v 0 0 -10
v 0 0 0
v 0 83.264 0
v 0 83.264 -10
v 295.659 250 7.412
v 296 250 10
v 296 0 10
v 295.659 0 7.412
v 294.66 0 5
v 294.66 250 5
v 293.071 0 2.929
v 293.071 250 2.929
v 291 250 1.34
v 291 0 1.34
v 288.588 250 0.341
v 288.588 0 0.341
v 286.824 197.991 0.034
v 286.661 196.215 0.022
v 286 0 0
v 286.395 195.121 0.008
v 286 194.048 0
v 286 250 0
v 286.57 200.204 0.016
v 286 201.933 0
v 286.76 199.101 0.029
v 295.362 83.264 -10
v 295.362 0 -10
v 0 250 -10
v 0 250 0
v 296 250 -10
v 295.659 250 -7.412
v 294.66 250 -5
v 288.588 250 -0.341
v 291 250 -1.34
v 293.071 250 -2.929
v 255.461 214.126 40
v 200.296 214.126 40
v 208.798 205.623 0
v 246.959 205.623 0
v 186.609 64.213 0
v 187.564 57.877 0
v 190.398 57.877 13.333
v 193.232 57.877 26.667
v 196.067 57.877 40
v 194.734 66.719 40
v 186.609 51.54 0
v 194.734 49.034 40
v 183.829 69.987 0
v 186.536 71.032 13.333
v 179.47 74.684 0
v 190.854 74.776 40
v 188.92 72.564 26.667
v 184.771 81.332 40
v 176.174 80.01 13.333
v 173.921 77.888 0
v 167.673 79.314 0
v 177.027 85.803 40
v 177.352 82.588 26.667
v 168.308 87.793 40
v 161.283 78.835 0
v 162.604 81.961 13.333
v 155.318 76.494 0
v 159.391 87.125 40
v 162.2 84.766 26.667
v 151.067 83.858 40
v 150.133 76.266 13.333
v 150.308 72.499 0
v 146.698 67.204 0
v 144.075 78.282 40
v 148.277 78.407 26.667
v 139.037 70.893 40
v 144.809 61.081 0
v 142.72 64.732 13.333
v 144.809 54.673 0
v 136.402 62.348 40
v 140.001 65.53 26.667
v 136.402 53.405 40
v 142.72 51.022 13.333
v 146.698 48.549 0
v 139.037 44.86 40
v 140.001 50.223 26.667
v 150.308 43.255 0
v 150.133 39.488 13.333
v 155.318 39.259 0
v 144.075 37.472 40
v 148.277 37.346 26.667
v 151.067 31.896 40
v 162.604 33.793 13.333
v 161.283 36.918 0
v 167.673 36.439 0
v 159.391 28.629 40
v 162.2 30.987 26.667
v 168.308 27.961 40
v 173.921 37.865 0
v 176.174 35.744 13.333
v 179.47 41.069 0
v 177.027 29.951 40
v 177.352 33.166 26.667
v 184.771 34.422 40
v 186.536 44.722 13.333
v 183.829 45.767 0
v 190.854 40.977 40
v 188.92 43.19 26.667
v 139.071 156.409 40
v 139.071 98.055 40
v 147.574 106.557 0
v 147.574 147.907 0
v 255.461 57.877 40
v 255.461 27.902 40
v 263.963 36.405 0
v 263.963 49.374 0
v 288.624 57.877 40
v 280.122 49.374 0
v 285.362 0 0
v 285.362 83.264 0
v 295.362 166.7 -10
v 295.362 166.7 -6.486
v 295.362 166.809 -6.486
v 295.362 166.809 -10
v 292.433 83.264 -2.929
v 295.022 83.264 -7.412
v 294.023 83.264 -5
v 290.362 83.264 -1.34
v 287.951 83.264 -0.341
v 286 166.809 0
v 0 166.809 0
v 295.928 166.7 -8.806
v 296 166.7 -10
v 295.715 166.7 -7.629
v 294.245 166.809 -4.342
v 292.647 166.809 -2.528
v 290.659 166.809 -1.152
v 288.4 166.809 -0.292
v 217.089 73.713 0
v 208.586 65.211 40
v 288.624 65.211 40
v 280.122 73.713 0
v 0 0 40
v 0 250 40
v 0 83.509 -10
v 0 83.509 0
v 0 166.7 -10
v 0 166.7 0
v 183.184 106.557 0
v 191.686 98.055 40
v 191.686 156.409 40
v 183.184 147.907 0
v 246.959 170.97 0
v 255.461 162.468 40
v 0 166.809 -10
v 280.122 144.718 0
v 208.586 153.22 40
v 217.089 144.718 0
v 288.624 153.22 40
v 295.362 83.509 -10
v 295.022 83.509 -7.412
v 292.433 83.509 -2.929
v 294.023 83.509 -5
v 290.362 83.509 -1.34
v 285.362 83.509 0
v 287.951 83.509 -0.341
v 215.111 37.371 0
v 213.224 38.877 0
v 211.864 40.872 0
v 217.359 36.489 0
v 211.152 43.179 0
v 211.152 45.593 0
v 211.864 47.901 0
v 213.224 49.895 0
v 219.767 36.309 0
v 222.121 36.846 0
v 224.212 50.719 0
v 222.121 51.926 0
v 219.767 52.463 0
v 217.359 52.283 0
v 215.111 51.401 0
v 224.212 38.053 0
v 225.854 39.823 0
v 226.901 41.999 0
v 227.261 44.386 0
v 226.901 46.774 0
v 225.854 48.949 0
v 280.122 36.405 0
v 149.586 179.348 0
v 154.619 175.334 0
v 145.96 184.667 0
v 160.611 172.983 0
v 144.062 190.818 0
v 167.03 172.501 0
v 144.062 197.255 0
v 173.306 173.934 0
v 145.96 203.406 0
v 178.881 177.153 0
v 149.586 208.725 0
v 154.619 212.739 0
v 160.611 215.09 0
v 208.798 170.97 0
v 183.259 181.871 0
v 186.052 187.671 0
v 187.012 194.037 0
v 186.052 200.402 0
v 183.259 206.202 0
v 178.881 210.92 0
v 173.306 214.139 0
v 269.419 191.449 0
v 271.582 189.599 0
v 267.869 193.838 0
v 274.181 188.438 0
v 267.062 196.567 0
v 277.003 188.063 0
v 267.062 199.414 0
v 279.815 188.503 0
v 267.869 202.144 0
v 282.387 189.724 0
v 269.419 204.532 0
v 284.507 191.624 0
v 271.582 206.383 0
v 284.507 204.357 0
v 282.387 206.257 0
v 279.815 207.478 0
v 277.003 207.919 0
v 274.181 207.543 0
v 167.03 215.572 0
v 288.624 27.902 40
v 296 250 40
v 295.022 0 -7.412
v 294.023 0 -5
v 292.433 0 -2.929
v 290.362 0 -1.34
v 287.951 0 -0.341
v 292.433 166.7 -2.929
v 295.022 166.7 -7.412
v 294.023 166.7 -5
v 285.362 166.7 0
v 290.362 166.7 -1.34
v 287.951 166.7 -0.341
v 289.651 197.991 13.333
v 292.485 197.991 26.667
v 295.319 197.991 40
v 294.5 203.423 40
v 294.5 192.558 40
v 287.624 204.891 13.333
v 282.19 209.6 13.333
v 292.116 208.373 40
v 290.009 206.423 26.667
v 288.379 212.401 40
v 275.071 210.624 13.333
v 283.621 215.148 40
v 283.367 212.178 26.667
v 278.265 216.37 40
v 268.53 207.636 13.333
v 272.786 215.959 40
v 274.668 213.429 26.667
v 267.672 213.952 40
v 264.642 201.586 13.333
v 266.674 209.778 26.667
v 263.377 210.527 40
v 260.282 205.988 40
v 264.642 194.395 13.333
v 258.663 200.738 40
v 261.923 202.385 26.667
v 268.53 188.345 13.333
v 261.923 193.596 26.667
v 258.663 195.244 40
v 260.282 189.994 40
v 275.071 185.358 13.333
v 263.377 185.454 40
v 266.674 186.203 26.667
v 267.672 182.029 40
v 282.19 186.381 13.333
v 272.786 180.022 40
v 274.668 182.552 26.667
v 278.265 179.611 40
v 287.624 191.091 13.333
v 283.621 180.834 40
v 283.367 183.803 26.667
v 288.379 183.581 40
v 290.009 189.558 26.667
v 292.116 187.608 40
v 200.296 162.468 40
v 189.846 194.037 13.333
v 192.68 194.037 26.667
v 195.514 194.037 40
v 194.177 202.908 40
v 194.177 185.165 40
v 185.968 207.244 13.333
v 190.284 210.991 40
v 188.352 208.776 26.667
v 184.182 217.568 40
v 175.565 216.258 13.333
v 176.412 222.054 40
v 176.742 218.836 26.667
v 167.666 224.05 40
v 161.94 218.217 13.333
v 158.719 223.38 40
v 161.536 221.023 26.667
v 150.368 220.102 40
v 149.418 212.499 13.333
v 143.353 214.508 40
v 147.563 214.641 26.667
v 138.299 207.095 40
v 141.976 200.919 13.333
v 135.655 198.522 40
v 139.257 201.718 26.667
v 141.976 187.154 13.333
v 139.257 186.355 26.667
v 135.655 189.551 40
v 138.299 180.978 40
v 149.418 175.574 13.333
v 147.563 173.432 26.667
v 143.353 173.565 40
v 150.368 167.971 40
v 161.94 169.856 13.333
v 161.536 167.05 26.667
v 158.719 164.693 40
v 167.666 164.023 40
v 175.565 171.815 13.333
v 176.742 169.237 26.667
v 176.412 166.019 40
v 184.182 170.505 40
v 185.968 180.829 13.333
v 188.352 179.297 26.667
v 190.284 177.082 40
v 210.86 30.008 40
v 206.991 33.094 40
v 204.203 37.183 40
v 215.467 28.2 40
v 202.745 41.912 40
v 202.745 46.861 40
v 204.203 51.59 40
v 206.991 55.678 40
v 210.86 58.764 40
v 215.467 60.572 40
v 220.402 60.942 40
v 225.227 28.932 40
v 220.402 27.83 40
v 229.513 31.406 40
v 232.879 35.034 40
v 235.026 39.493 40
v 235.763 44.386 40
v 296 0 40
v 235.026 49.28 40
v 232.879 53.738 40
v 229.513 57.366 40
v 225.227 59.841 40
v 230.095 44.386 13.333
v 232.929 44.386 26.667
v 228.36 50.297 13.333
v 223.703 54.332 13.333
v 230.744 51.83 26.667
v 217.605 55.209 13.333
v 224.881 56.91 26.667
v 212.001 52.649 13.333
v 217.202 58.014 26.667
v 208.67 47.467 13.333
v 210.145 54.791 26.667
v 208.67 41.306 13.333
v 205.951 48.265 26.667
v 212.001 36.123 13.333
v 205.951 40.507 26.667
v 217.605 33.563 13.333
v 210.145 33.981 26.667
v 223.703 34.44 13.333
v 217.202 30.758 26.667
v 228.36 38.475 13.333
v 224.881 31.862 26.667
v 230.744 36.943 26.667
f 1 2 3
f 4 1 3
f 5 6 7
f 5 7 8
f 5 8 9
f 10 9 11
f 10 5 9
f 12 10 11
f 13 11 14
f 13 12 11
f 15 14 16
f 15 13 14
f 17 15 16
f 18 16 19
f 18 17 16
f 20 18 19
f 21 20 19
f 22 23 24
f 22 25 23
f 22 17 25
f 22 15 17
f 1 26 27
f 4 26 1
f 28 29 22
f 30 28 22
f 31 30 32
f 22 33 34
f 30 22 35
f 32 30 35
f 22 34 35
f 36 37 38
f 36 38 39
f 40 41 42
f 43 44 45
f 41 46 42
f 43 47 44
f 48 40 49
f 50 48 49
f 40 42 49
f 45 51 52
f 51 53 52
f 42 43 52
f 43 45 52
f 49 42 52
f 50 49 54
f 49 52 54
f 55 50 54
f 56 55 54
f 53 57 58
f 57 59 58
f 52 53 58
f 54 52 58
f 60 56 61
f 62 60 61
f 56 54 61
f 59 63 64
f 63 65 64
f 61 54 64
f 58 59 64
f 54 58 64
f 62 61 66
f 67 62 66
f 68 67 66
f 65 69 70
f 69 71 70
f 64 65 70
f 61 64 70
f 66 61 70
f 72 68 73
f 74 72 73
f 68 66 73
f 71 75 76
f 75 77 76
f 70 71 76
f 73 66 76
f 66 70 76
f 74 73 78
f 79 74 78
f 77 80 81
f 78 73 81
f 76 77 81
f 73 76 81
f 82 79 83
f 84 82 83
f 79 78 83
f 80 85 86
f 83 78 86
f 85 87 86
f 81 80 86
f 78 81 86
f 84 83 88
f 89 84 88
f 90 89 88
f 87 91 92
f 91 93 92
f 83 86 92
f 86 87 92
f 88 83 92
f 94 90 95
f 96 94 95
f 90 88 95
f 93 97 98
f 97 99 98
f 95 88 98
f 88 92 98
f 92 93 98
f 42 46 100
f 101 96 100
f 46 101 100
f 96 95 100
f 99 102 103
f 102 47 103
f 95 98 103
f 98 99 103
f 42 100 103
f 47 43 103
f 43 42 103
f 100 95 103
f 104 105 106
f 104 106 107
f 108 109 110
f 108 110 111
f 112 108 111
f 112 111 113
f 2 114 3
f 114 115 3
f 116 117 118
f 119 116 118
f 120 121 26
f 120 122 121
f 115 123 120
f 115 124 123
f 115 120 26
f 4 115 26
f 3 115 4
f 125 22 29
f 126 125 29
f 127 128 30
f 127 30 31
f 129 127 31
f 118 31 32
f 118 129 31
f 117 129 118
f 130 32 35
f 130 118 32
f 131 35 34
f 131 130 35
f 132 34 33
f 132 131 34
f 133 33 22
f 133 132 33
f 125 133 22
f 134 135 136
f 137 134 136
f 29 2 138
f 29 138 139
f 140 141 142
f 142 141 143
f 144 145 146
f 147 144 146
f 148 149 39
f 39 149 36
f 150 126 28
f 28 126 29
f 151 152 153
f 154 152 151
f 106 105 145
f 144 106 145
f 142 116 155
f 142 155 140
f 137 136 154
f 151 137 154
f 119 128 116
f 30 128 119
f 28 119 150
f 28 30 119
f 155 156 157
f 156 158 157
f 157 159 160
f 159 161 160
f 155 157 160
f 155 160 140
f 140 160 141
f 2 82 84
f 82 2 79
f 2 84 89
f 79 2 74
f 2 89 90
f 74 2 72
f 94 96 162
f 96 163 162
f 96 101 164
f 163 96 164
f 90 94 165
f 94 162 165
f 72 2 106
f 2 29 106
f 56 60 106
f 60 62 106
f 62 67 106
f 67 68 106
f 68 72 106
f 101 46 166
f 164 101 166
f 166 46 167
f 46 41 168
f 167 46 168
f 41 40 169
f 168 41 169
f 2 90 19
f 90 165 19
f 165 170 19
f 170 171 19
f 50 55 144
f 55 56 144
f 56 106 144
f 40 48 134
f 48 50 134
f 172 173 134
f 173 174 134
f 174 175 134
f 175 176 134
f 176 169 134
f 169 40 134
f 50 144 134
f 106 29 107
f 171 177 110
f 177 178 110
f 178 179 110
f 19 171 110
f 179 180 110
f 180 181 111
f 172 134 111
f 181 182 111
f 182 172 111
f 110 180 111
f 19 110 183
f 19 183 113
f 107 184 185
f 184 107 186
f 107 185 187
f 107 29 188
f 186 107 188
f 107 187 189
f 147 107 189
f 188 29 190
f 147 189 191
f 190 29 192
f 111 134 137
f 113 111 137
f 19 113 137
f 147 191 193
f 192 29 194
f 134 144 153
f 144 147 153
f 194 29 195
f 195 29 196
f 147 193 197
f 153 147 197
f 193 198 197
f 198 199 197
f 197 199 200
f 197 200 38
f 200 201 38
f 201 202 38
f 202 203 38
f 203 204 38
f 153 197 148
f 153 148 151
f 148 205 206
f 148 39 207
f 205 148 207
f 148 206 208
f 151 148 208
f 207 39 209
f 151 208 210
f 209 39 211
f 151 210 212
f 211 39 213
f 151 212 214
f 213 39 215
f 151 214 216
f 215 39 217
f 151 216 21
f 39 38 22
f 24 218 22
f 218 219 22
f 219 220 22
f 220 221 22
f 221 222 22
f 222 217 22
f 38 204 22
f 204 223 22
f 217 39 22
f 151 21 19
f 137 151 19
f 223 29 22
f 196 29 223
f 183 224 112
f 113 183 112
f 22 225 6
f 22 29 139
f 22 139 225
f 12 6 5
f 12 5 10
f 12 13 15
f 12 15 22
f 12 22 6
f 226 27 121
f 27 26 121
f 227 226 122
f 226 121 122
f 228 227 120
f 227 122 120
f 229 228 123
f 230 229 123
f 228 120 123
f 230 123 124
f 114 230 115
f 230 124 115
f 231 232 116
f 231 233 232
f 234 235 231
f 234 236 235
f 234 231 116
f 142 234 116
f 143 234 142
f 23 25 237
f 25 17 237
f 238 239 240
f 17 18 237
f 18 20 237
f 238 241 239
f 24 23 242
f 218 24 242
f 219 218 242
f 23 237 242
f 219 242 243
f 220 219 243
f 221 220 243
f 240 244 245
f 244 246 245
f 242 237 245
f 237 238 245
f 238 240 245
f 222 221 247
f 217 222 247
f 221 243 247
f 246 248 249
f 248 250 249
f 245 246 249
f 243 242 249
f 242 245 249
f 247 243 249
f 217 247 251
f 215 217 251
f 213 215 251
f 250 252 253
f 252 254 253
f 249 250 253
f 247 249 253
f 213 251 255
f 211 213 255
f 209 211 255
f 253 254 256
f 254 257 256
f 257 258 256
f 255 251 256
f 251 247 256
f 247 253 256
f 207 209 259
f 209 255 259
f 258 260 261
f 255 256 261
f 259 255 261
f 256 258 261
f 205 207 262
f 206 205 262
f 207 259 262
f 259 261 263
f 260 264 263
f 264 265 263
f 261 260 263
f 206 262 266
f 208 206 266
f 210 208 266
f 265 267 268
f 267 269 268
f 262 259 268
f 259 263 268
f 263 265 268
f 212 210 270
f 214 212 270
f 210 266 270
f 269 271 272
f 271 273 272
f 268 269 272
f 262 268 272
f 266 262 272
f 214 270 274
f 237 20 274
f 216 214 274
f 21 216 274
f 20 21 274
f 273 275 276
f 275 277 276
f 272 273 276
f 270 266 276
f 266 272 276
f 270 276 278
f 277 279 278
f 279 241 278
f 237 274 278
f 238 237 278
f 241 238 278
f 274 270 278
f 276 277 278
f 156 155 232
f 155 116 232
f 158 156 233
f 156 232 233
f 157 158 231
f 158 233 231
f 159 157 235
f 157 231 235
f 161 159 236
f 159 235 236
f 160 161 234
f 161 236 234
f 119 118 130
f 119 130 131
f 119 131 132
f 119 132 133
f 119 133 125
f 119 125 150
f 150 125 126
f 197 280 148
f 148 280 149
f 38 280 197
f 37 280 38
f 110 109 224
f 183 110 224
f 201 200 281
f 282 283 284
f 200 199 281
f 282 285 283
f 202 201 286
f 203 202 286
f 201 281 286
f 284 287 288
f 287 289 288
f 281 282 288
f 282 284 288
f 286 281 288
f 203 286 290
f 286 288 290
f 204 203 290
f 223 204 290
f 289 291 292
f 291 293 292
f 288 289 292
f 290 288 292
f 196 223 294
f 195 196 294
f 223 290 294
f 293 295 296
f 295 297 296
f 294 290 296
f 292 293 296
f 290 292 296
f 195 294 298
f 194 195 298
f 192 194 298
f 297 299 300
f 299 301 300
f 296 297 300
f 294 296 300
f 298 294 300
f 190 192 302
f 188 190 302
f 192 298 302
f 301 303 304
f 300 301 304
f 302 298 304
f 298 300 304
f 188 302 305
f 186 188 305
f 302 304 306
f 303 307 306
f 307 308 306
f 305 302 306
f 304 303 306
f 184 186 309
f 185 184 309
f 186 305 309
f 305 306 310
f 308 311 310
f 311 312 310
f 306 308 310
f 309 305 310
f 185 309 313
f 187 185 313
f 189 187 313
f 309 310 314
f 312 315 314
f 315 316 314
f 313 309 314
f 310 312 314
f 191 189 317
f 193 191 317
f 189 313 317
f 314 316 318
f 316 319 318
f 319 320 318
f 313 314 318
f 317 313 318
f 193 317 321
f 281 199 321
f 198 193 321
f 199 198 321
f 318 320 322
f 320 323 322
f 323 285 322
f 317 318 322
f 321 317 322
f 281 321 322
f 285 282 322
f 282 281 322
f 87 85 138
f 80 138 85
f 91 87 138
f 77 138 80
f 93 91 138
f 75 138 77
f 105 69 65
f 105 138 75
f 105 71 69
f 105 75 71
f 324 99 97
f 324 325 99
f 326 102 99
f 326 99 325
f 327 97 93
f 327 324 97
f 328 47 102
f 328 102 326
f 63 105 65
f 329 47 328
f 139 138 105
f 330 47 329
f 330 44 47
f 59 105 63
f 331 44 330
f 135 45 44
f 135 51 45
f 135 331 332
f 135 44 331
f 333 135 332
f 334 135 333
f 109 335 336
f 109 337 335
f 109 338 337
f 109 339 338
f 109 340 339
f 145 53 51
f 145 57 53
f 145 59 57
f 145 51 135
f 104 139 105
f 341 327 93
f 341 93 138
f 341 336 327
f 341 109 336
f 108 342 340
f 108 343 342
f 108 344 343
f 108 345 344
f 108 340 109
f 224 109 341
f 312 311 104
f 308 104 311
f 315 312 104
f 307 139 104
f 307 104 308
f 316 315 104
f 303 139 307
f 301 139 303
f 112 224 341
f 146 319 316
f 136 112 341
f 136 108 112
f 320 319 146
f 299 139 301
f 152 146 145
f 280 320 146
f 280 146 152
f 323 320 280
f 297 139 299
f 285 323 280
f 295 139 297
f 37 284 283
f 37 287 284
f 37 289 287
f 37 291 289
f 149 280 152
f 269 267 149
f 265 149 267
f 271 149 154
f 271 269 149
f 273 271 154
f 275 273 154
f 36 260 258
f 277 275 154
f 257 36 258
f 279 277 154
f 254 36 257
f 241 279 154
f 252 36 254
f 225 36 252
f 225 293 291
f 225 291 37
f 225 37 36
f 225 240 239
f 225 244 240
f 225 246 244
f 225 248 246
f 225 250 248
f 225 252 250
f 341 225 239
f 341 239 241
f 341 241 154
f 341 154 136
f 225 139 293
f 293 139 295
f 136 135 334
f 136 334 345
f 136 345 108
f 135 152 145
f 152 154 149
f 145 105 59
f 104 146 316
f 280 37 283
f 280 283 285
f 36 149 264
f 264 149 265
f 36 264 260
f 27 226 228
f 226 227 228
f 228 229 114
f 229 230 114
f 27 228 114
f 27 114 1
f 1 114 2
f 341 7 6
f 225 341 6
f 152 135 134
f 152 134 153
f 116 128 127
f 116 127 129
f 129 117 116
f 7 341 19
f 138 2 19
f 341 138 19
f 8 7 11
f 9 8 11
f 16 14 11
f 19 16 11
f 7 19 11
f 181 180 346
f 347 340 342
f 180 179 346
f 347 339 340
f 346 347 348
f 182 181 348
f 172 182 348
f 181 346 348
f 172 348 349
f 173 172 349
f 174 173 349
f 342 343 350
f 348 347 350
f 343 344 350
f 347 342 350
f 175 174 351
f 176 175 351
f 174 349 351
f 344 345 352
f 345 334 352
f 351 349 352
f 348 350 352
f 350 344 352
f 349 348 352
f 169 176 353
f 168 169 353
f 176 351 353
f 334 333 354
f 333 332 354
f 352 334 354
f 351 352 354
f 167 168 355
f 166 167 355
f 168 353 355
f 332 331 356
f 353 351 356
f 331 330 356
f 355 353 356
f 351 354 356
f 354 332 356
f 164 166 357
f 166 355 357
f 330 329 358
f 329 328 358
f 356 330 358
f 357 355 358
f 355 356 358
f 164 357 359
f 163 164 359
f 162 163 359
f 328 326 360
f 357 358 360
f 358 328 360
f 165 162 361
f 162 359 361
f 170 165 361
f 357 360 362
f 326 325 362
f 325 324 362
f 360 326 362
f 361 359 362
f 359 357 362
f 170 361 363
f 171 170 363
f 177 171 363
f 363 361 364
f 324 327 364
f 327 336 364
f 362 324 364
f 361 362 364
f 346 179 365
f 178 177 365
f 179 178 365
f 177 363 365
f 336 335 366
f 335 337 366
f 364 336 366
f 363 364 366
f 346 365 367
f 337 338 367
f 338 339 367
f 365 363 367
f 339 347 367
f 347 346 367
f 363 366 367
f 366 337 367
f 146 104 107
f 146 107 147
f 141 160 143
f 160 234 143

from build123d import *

# Parameters (mm, degrees)
SKETCH2_W                    = 296
SKETCH2_H                    = 250
BOSS_EXTRUDE1_DEPTH          = 40
BOSS_EXTRUDE2_DEPTH          = 10
SKETCH4_W                    = 295.362249347
SKETCH4_H                    = 83.190562337
BOSS_EXTRUDE2_2_DEPTH        = 10
SKETCH4_H_2                  = 83.264102062
BOSS_EXTRUDE2_3_DEPTH        = 10
FILLET1_R                    = 10
FILLET4_R                    = 10
FILLET5_R                    = 10
FILLET6_R                    = 10
SKETCH8_R                    = 30.097695609
CUT_EXTRUDE1_DEPTH           = 45
CUT_EXTRUDE1_DRAFT           = -12
SKETCH8_R_2                  = 30
CUT_EXTRUDE1_PROFILE_2_DEPTH = 45
CUT_EXTRUDE1_PROFILE_2_DRAFT = -12
SKETCH8_R_3                  = 18.430965522
CUT_EXTRUDE1_PROFILE_3_DEPTH = 45
CUT_EXTRUDE1_PROFILE_3_DRAFT = -12
SKETCH8_R_4                  = 16.602168906
CUT_EXTRUDE1_PROFILE_4_DEPTH = 45
CUT_EXTRUDE1_PROFILE_4_DRAFT = -12
SKETCH8_W                    = 52.614428909
SKETCH8_H                    = 58.35418479
CUT_EXTRUDE1_PROFILE_5_DEPTH = 45
CUT_EXTRUDE1_PROFILE_5_DRAFT = -12
SKETCH8_W_2                  = 80.037707008
SKETCH8_H_2                  = 88.009590175
CUT_EXTRUDE1_PROFILE_6_DEPTH = 45
CUT_EXTRUDE1_PROFILE_6_DRAFT = -12
SKETCH8_W_3                  = 55.165431523
SKETCH8_H_3                  = 51.657802929
CUT_EXTRUDE1_PROFILE_7_DEPTH = 45
CUT_EXTRUDE1_PROFILE_7_DRAFT = -12
SKETCH8_W_4                  = 33.163033979
SKETCH8_H_4                  = 29.974280712
CUT_EXTRUDE1_PROFILE_8_DEPTH = 45
CUT_EXTRUDE1_PROFILE_8_DRAFT = -12


with BuildPart() as part:
    # Sketch2 → Boss-Extrude1 (new body)
    with BuildSketch(Plane.XY):
        with Locations((148, 125)):
            Rectangle(SKETCH2_W, SKETCH2_H)
    extrude(amount=BOSS_EXTRUDE1_DEPTH)

    # Fillet1
    fillet1_edges = [part.edges().sort_by_distance(p)[0] for p in [
        (296, 125, 0),
    ]]
    fillet(fillet1_edges, radius=FILLET1_R)


with BuildPart() as body_2:
    # Sketch4 → Boss-Extrude2 (new body)
    with BuildSketch(Plane(origin=(0, 0, 0), x_dir=(-1, 0, 0), z_dir=(0, 0, -1))):
        Polygon((0, 250), (-296, 250), (-296, 166.7), (-295.362249347, 166.7), (-295.362249347, 166.809437663), (0, 166.809437663), align=None)
    extrude(amount=BOSS_EXTRUDE2_DEPTH)

    # Fillet4
    fillet4_edges = [body_2.edges().sort_by_distance(p)[0] for p in [
        (296, 208.35, 0),
    ]]
    fillet(fillet4_edges, radius=FILLET4_R - 0.0001)  # a hair under: the kernel refuses the full size


with BuildPart() as body_3:
    # Sketch4 → Boss-Extrude2 2 (new body)
    with BuildSketch(Plane(origin=(0, 0, 0), x_dir=(-1, 0, 0), z_dir=(0, 0, -1))):
        with Locations((-147.681124674, 125.104718832)):
            Rectangle(SKETCH4_W, SKETCH4_H)
    extrude(amount=BOSS_EXTRUDE2_2_DEPTH)

    # Fillet5
    fillet5_edges = [body_3.edges().sort_by_distance(p)[0] for p in [
        (295.362249347, 125.104718832, 0),
    ]]
    fillet(fillet5_edges, radius=FILLET5_R - 0.0001)  # a hair under: the kernel refuses the full size


with BuildPart() as body_4:
    # Sketch4 → Boss-Extrude2 3 (new body)
    with BuildSketch(Plane(origin=(0, 0, 0), x_dir=(-1, 0, 0), z_dir=(0, 0, -1))):
        with Locations((-147.681124674, 41.632051031)):
            Rectangle(SKETCH4_W, SKETCH4_H_2)
    extrude(amount=BOSS_EXTRUDE2_3_DEPTH)

    # Fillet6
    fillet6_edges = [body_4.edges().sort_by_distance(p)[0] for p in [
        (295.362249347, 41.632051031, 0),
    ]]
    fillet(fillet6_edges, radius=FILLET6_R - 0.0001)  # a hair under: the kernel refuses the full size


with BuildPart() as cut_extrude1_tool:
    # Sketch8 → Cut-Extrude1 (with draft: the straight prism first)
    with BuildSketch(Plane.XY.offset(40)):
        with Locations((165.416417311, 194.036508235)):
            Circle(SKETCH8_R)
    extrude(amount=-CUT_EXTRUDE1_DEPTH)
    # Cut-Extrude1: the draft: its side faces are tilted about the plane it starts from
    cut_extrude1_sides = [cut_extrude1_tool.faces().sort_by_distance(p)[0] for p in [
        (135.318721702, 194.036508235, 17.5),
    ]]
    draft(cut_extrude1_sides, Plane.XY.offset(40), CUT_EXTRUDE1_DRAFT)


with BuildPart() as part_1:
    add(part.part)

    # Cut-Extrude1: cut by cut_extrude1_tool
    add(cut_extrude1_tool.part, mode=Mode.SUBTRACT)


with BuildPart() as cut_extrude1_profile_2_tool:
    # Sketch8 → Cut-Extrude1 profile 2 (with draft: the straight prism first)
    with BuildSketch(Plane.XY.offset(40)):
        with Locations((166.066556831, 57.876743725)):
            Circle(SKETCH8_R_2)
    extrude(amount=-CUT_EXTRUDE1_PROFILE_2_DEPTH)
    # Cut-Extrude1 profile 2: the draft: its side faces are tilted about the plane it starts from
    cut_extrude1_profile_2_sides = [cut_extrude1_profile_2_tool.faces().sort_by_distance(p)[0] for p in [
        (136.066556831, 57.876743725, 17.5),
    ]]
    draft(cut_extrude1_profile_2_sides, Plane.XY.offset(40), CUT_EXTRUDE1_PROFILE_2_DRAFT)


with BuildPart() as part_2:
    add(part_1.part)

    # Cut-Extrude1 profile 2: cut by cut_extrude1_profile_2_tool
    add(cut_extrude1_profile_2_tool.part, mode=Mode.SUBTRACT)


with BuildPart() as cut_extrude1_profile_3_tool:
    # Sketch8 → Cut-Extrude1 profile 3 (with draft: the straight prism first)
    with BuildSketch(Plane.XY.offset(40)):
        with Locations((276.887756181, 197.990617675)):
            Circle(SKETCH8_R_3)
    extrude(amount=-CUT_EXTRUDE1_PROFILE_3_DEPTH)
    # Cut-Extrude1 profile 3: the draft: its side faces are tilted about the plane it starts from
    cut_extrude1_profile_3_sides = [cut_extrude1_profile_3_tool.faces().sort_by_distance(p)[0] for p in [
        (258.456790659, 197.990617675, 17.5),
    ]]
    draft(cut_extrude1_profile_3_sides, Plane.XY.offset(40), CUT_EXTRUDE1_PROFILE_3_DRAFT)


with BuildPart() as part_3:
    add(part_2.part)

    # Cut-Extrude1 profile 3: cut by cut_extrude1_profile_3_tool
    add(cut_extrude1_profile_3_tool.part, mode=Mode.SUBTRACT)


with BuildPart() as cut_extrude1_profile_4_tool:
    # Sketch8 → Cut-Extrude1 profile 4 (with draft: the straight prism first)
    with BuildSketch(Plane.XY.offset(40)):
        with Locations((219.161303371, 44.386097935)):
            Circle(SKETCH8_R_4)
    extrude(amount=-CUT_EXTRUDE1_PROFILE_4_DEPTH)
    # Cut-Extrude1 profile 4: the draft: its side faces are tilted about the plane it starts from
    cut_extrude1_profile_4_sides = [cut_extrude1_profile_4_tool.faces().sort_by_distance(p)[0] for p in [
        (202.559134465, 44.386097935, 17.5),
    ]]
    draft(cut_extrude1_profile_4_sides, Plane.XY.offset(40), CUT_EXTRUDE1_PROFILE_4_DRAFT)


with BuildPart() as part_4:
    add(part_3.part)

    # Cut-Extrude1 profile 4: cut by cut_extrude1_profile_4_tool
    add(cut_extrude1_profile_4_tool.part, mode=Mode.SUBTRACT)


with BuildPart() as cut_extrude1_profile_5_tool:
    # Sketch8 → Cut-Extrude1 profile 5 (with draft: the straight prism first)
    with BuildSketch(Plane.XY.offset(40)):
        with Locations((165.378705307, 127.232127287)):
            Rectangle(SKETCH8_W, SKETCH8_H)
    extrude(amount=-CUT_EXTRUDE1_PROFILE_5_DEPTH)
    # Cut-Extrude1 profile 5: the draft: its side faces are tilted about the plane it starts from
    cut_extrude1_profile_5_sides = [cut_extrude1_profile_5_tool.faces().sort_by_distance(p)[0] for p in [
        (139.071490852, 127.232127287, 17.5),
        (165.378705306, 98.055034892, 17.5),
        (191.685919761, 127.232127287, 17.5),
        (165.378705306, 156.409219682, 17.5),
    ]]
    draft(cut_extrude1_profile_5_sides, Plane.XY.offset(40), CUT_EXTRUDE1_PROFILE_5_DRAFT)


with BuildPart() as part_5:
    add(part_4.part)

    # Cut-Extrude1 profile 5: cut by cut_extrude1_profile_5_tool
    add(cut_extrude1_profile_5_tool.part, mode=Mode.SUBTRACT)


with BuildPart() as cut_extrude1_profile_6_tool:
    # Sketch8 → Cut-Extrude1 profile 6 (with draft: the straight prism first)
    with BuildSketch(Plane.XY.offset(40)):
        with Locations((248.605165581, 109.215671328)):
            Rectangle(SKETCH8_W_2, SKETCH8_H_2)
    extrude(amount=-CUT_EXTRUDE1_PROFILE_6_DEPTH)
    # Cut-Extrude1 profile 6: the draft: its side faces are tilted about the plane it starts from
    cut_extrude1_profile_6_sides = [cut_extrude1_profile_6_tool.faces().sort_by_distance(p)[0] for p in [
        (208.586312077, 109.215671327, 17.5),
        (248.605165581, 65.21087624, 17.5),
        (288.624019085, 109.215671327, 17.5),
        (248.605165581, 153.220466415, 17.5),
    ]]
    draft(cut_extrude1_profile_6_sides, Plane.XY.offset(40), CUT_EXTRUDE1_PROFILE_6_DRAFT)


with BuildPart() as part_6:
    add(part_5.part)

    # Cut-Extrude1 profile 6: cut by cut_extrude1_profile_6_tool
    add(cut_extrude1_profile_6_tool.part, mode=Mode.SUBTRACT)


with BuildPart() as cut_extrude1_profile_7_tool:
    # Sketch8 → Cut-Extrude1 profile 7 (with draft: the straight prism first)
    with BuildSketch(Plane.XY.offset(40)):
        with Locations((227.878269345, 188.296752355)):
            Rectangle(SKETCH8_W_3, SKETCH8_H_3)
    extrude(amount=-CUT_EXTRUDE1_PROFILE_7_DEPTH)
    # Cut-Extrude1 profile 7: the draft: its side faces are tilted about the plane it starts from
    cut_extrude1_profile_7_sides = [cut_extrude1_profile_7_tool.faces().sort_by_distance(p)[0] for p in [
        (200.295553583, 188.296752354, 17.5),
        (227.878269344, 162.46785089, 17.5),
        (255.460985106, 188.296752354, 17.5),
        (227.878269344, 214.125653819, 17.5),
    ]]
    draft(cut_extrude1_profile_7_sides, Plane.XY.offset(40), CUT_EXTRUDE1_PROFILE_7_DRAFT)


with BuildPart() as part_7:
    add(part_6.part)

    # Cut-Extrude1 profile 7: cut by cut_extrude1_profile_7_tool
    add(cut_extrude1_profile_7_tool.part, mode=Mode.SUBTRACT)


with BuildPart() as cut_extrude1_profile_8_tool:
    # Sketch8 → Cut-Extrude1 profile 8 (with draft: the straight prism first)
    with BuildSketch(Plane.XY.offset(40)):
        with Locations((272.042502096, 42.889603369)):
            Rectangle(SKETCH8_W_4, SKETCH8_H_4)
    extrude(amount=-CUT_EXTRUDE1_PROFILE_8_DEPTH)
    # Cut-Extrude1 profile 8: the draft: its side faces are tilted about the plane it starts from
    cut_extrude1_profile_8_sides = [cut_extrude1_profile_8_tool.faces().sort_by_distance(p)[0] for p in [
        (255.460985106, 42.889603369, 17.5),
        (272.042502095, 27.902463013, 17.5),
        (288.624019085, 42.889603369, 17.5),
        (272.042502095, 57.876743725, 17.5),
    ]]
    draft(cut_extrude1_profile_8_sides, Plane.XY.offset(40), CUT_EXTRUDE1_PROFILE_8_DRAFT)


with BuildPart() as part_8:
    add(part_7.part)

    # Cut-Extrude1 profile 8: cut by cut_extrude1_profile_8_tool
    add(cut_extrude1_profile_8_tool.part, mode=Mode.SUBTRACT)


solid = Compound([body_2.part, body_3.part, body_4.part, part_8.part])
